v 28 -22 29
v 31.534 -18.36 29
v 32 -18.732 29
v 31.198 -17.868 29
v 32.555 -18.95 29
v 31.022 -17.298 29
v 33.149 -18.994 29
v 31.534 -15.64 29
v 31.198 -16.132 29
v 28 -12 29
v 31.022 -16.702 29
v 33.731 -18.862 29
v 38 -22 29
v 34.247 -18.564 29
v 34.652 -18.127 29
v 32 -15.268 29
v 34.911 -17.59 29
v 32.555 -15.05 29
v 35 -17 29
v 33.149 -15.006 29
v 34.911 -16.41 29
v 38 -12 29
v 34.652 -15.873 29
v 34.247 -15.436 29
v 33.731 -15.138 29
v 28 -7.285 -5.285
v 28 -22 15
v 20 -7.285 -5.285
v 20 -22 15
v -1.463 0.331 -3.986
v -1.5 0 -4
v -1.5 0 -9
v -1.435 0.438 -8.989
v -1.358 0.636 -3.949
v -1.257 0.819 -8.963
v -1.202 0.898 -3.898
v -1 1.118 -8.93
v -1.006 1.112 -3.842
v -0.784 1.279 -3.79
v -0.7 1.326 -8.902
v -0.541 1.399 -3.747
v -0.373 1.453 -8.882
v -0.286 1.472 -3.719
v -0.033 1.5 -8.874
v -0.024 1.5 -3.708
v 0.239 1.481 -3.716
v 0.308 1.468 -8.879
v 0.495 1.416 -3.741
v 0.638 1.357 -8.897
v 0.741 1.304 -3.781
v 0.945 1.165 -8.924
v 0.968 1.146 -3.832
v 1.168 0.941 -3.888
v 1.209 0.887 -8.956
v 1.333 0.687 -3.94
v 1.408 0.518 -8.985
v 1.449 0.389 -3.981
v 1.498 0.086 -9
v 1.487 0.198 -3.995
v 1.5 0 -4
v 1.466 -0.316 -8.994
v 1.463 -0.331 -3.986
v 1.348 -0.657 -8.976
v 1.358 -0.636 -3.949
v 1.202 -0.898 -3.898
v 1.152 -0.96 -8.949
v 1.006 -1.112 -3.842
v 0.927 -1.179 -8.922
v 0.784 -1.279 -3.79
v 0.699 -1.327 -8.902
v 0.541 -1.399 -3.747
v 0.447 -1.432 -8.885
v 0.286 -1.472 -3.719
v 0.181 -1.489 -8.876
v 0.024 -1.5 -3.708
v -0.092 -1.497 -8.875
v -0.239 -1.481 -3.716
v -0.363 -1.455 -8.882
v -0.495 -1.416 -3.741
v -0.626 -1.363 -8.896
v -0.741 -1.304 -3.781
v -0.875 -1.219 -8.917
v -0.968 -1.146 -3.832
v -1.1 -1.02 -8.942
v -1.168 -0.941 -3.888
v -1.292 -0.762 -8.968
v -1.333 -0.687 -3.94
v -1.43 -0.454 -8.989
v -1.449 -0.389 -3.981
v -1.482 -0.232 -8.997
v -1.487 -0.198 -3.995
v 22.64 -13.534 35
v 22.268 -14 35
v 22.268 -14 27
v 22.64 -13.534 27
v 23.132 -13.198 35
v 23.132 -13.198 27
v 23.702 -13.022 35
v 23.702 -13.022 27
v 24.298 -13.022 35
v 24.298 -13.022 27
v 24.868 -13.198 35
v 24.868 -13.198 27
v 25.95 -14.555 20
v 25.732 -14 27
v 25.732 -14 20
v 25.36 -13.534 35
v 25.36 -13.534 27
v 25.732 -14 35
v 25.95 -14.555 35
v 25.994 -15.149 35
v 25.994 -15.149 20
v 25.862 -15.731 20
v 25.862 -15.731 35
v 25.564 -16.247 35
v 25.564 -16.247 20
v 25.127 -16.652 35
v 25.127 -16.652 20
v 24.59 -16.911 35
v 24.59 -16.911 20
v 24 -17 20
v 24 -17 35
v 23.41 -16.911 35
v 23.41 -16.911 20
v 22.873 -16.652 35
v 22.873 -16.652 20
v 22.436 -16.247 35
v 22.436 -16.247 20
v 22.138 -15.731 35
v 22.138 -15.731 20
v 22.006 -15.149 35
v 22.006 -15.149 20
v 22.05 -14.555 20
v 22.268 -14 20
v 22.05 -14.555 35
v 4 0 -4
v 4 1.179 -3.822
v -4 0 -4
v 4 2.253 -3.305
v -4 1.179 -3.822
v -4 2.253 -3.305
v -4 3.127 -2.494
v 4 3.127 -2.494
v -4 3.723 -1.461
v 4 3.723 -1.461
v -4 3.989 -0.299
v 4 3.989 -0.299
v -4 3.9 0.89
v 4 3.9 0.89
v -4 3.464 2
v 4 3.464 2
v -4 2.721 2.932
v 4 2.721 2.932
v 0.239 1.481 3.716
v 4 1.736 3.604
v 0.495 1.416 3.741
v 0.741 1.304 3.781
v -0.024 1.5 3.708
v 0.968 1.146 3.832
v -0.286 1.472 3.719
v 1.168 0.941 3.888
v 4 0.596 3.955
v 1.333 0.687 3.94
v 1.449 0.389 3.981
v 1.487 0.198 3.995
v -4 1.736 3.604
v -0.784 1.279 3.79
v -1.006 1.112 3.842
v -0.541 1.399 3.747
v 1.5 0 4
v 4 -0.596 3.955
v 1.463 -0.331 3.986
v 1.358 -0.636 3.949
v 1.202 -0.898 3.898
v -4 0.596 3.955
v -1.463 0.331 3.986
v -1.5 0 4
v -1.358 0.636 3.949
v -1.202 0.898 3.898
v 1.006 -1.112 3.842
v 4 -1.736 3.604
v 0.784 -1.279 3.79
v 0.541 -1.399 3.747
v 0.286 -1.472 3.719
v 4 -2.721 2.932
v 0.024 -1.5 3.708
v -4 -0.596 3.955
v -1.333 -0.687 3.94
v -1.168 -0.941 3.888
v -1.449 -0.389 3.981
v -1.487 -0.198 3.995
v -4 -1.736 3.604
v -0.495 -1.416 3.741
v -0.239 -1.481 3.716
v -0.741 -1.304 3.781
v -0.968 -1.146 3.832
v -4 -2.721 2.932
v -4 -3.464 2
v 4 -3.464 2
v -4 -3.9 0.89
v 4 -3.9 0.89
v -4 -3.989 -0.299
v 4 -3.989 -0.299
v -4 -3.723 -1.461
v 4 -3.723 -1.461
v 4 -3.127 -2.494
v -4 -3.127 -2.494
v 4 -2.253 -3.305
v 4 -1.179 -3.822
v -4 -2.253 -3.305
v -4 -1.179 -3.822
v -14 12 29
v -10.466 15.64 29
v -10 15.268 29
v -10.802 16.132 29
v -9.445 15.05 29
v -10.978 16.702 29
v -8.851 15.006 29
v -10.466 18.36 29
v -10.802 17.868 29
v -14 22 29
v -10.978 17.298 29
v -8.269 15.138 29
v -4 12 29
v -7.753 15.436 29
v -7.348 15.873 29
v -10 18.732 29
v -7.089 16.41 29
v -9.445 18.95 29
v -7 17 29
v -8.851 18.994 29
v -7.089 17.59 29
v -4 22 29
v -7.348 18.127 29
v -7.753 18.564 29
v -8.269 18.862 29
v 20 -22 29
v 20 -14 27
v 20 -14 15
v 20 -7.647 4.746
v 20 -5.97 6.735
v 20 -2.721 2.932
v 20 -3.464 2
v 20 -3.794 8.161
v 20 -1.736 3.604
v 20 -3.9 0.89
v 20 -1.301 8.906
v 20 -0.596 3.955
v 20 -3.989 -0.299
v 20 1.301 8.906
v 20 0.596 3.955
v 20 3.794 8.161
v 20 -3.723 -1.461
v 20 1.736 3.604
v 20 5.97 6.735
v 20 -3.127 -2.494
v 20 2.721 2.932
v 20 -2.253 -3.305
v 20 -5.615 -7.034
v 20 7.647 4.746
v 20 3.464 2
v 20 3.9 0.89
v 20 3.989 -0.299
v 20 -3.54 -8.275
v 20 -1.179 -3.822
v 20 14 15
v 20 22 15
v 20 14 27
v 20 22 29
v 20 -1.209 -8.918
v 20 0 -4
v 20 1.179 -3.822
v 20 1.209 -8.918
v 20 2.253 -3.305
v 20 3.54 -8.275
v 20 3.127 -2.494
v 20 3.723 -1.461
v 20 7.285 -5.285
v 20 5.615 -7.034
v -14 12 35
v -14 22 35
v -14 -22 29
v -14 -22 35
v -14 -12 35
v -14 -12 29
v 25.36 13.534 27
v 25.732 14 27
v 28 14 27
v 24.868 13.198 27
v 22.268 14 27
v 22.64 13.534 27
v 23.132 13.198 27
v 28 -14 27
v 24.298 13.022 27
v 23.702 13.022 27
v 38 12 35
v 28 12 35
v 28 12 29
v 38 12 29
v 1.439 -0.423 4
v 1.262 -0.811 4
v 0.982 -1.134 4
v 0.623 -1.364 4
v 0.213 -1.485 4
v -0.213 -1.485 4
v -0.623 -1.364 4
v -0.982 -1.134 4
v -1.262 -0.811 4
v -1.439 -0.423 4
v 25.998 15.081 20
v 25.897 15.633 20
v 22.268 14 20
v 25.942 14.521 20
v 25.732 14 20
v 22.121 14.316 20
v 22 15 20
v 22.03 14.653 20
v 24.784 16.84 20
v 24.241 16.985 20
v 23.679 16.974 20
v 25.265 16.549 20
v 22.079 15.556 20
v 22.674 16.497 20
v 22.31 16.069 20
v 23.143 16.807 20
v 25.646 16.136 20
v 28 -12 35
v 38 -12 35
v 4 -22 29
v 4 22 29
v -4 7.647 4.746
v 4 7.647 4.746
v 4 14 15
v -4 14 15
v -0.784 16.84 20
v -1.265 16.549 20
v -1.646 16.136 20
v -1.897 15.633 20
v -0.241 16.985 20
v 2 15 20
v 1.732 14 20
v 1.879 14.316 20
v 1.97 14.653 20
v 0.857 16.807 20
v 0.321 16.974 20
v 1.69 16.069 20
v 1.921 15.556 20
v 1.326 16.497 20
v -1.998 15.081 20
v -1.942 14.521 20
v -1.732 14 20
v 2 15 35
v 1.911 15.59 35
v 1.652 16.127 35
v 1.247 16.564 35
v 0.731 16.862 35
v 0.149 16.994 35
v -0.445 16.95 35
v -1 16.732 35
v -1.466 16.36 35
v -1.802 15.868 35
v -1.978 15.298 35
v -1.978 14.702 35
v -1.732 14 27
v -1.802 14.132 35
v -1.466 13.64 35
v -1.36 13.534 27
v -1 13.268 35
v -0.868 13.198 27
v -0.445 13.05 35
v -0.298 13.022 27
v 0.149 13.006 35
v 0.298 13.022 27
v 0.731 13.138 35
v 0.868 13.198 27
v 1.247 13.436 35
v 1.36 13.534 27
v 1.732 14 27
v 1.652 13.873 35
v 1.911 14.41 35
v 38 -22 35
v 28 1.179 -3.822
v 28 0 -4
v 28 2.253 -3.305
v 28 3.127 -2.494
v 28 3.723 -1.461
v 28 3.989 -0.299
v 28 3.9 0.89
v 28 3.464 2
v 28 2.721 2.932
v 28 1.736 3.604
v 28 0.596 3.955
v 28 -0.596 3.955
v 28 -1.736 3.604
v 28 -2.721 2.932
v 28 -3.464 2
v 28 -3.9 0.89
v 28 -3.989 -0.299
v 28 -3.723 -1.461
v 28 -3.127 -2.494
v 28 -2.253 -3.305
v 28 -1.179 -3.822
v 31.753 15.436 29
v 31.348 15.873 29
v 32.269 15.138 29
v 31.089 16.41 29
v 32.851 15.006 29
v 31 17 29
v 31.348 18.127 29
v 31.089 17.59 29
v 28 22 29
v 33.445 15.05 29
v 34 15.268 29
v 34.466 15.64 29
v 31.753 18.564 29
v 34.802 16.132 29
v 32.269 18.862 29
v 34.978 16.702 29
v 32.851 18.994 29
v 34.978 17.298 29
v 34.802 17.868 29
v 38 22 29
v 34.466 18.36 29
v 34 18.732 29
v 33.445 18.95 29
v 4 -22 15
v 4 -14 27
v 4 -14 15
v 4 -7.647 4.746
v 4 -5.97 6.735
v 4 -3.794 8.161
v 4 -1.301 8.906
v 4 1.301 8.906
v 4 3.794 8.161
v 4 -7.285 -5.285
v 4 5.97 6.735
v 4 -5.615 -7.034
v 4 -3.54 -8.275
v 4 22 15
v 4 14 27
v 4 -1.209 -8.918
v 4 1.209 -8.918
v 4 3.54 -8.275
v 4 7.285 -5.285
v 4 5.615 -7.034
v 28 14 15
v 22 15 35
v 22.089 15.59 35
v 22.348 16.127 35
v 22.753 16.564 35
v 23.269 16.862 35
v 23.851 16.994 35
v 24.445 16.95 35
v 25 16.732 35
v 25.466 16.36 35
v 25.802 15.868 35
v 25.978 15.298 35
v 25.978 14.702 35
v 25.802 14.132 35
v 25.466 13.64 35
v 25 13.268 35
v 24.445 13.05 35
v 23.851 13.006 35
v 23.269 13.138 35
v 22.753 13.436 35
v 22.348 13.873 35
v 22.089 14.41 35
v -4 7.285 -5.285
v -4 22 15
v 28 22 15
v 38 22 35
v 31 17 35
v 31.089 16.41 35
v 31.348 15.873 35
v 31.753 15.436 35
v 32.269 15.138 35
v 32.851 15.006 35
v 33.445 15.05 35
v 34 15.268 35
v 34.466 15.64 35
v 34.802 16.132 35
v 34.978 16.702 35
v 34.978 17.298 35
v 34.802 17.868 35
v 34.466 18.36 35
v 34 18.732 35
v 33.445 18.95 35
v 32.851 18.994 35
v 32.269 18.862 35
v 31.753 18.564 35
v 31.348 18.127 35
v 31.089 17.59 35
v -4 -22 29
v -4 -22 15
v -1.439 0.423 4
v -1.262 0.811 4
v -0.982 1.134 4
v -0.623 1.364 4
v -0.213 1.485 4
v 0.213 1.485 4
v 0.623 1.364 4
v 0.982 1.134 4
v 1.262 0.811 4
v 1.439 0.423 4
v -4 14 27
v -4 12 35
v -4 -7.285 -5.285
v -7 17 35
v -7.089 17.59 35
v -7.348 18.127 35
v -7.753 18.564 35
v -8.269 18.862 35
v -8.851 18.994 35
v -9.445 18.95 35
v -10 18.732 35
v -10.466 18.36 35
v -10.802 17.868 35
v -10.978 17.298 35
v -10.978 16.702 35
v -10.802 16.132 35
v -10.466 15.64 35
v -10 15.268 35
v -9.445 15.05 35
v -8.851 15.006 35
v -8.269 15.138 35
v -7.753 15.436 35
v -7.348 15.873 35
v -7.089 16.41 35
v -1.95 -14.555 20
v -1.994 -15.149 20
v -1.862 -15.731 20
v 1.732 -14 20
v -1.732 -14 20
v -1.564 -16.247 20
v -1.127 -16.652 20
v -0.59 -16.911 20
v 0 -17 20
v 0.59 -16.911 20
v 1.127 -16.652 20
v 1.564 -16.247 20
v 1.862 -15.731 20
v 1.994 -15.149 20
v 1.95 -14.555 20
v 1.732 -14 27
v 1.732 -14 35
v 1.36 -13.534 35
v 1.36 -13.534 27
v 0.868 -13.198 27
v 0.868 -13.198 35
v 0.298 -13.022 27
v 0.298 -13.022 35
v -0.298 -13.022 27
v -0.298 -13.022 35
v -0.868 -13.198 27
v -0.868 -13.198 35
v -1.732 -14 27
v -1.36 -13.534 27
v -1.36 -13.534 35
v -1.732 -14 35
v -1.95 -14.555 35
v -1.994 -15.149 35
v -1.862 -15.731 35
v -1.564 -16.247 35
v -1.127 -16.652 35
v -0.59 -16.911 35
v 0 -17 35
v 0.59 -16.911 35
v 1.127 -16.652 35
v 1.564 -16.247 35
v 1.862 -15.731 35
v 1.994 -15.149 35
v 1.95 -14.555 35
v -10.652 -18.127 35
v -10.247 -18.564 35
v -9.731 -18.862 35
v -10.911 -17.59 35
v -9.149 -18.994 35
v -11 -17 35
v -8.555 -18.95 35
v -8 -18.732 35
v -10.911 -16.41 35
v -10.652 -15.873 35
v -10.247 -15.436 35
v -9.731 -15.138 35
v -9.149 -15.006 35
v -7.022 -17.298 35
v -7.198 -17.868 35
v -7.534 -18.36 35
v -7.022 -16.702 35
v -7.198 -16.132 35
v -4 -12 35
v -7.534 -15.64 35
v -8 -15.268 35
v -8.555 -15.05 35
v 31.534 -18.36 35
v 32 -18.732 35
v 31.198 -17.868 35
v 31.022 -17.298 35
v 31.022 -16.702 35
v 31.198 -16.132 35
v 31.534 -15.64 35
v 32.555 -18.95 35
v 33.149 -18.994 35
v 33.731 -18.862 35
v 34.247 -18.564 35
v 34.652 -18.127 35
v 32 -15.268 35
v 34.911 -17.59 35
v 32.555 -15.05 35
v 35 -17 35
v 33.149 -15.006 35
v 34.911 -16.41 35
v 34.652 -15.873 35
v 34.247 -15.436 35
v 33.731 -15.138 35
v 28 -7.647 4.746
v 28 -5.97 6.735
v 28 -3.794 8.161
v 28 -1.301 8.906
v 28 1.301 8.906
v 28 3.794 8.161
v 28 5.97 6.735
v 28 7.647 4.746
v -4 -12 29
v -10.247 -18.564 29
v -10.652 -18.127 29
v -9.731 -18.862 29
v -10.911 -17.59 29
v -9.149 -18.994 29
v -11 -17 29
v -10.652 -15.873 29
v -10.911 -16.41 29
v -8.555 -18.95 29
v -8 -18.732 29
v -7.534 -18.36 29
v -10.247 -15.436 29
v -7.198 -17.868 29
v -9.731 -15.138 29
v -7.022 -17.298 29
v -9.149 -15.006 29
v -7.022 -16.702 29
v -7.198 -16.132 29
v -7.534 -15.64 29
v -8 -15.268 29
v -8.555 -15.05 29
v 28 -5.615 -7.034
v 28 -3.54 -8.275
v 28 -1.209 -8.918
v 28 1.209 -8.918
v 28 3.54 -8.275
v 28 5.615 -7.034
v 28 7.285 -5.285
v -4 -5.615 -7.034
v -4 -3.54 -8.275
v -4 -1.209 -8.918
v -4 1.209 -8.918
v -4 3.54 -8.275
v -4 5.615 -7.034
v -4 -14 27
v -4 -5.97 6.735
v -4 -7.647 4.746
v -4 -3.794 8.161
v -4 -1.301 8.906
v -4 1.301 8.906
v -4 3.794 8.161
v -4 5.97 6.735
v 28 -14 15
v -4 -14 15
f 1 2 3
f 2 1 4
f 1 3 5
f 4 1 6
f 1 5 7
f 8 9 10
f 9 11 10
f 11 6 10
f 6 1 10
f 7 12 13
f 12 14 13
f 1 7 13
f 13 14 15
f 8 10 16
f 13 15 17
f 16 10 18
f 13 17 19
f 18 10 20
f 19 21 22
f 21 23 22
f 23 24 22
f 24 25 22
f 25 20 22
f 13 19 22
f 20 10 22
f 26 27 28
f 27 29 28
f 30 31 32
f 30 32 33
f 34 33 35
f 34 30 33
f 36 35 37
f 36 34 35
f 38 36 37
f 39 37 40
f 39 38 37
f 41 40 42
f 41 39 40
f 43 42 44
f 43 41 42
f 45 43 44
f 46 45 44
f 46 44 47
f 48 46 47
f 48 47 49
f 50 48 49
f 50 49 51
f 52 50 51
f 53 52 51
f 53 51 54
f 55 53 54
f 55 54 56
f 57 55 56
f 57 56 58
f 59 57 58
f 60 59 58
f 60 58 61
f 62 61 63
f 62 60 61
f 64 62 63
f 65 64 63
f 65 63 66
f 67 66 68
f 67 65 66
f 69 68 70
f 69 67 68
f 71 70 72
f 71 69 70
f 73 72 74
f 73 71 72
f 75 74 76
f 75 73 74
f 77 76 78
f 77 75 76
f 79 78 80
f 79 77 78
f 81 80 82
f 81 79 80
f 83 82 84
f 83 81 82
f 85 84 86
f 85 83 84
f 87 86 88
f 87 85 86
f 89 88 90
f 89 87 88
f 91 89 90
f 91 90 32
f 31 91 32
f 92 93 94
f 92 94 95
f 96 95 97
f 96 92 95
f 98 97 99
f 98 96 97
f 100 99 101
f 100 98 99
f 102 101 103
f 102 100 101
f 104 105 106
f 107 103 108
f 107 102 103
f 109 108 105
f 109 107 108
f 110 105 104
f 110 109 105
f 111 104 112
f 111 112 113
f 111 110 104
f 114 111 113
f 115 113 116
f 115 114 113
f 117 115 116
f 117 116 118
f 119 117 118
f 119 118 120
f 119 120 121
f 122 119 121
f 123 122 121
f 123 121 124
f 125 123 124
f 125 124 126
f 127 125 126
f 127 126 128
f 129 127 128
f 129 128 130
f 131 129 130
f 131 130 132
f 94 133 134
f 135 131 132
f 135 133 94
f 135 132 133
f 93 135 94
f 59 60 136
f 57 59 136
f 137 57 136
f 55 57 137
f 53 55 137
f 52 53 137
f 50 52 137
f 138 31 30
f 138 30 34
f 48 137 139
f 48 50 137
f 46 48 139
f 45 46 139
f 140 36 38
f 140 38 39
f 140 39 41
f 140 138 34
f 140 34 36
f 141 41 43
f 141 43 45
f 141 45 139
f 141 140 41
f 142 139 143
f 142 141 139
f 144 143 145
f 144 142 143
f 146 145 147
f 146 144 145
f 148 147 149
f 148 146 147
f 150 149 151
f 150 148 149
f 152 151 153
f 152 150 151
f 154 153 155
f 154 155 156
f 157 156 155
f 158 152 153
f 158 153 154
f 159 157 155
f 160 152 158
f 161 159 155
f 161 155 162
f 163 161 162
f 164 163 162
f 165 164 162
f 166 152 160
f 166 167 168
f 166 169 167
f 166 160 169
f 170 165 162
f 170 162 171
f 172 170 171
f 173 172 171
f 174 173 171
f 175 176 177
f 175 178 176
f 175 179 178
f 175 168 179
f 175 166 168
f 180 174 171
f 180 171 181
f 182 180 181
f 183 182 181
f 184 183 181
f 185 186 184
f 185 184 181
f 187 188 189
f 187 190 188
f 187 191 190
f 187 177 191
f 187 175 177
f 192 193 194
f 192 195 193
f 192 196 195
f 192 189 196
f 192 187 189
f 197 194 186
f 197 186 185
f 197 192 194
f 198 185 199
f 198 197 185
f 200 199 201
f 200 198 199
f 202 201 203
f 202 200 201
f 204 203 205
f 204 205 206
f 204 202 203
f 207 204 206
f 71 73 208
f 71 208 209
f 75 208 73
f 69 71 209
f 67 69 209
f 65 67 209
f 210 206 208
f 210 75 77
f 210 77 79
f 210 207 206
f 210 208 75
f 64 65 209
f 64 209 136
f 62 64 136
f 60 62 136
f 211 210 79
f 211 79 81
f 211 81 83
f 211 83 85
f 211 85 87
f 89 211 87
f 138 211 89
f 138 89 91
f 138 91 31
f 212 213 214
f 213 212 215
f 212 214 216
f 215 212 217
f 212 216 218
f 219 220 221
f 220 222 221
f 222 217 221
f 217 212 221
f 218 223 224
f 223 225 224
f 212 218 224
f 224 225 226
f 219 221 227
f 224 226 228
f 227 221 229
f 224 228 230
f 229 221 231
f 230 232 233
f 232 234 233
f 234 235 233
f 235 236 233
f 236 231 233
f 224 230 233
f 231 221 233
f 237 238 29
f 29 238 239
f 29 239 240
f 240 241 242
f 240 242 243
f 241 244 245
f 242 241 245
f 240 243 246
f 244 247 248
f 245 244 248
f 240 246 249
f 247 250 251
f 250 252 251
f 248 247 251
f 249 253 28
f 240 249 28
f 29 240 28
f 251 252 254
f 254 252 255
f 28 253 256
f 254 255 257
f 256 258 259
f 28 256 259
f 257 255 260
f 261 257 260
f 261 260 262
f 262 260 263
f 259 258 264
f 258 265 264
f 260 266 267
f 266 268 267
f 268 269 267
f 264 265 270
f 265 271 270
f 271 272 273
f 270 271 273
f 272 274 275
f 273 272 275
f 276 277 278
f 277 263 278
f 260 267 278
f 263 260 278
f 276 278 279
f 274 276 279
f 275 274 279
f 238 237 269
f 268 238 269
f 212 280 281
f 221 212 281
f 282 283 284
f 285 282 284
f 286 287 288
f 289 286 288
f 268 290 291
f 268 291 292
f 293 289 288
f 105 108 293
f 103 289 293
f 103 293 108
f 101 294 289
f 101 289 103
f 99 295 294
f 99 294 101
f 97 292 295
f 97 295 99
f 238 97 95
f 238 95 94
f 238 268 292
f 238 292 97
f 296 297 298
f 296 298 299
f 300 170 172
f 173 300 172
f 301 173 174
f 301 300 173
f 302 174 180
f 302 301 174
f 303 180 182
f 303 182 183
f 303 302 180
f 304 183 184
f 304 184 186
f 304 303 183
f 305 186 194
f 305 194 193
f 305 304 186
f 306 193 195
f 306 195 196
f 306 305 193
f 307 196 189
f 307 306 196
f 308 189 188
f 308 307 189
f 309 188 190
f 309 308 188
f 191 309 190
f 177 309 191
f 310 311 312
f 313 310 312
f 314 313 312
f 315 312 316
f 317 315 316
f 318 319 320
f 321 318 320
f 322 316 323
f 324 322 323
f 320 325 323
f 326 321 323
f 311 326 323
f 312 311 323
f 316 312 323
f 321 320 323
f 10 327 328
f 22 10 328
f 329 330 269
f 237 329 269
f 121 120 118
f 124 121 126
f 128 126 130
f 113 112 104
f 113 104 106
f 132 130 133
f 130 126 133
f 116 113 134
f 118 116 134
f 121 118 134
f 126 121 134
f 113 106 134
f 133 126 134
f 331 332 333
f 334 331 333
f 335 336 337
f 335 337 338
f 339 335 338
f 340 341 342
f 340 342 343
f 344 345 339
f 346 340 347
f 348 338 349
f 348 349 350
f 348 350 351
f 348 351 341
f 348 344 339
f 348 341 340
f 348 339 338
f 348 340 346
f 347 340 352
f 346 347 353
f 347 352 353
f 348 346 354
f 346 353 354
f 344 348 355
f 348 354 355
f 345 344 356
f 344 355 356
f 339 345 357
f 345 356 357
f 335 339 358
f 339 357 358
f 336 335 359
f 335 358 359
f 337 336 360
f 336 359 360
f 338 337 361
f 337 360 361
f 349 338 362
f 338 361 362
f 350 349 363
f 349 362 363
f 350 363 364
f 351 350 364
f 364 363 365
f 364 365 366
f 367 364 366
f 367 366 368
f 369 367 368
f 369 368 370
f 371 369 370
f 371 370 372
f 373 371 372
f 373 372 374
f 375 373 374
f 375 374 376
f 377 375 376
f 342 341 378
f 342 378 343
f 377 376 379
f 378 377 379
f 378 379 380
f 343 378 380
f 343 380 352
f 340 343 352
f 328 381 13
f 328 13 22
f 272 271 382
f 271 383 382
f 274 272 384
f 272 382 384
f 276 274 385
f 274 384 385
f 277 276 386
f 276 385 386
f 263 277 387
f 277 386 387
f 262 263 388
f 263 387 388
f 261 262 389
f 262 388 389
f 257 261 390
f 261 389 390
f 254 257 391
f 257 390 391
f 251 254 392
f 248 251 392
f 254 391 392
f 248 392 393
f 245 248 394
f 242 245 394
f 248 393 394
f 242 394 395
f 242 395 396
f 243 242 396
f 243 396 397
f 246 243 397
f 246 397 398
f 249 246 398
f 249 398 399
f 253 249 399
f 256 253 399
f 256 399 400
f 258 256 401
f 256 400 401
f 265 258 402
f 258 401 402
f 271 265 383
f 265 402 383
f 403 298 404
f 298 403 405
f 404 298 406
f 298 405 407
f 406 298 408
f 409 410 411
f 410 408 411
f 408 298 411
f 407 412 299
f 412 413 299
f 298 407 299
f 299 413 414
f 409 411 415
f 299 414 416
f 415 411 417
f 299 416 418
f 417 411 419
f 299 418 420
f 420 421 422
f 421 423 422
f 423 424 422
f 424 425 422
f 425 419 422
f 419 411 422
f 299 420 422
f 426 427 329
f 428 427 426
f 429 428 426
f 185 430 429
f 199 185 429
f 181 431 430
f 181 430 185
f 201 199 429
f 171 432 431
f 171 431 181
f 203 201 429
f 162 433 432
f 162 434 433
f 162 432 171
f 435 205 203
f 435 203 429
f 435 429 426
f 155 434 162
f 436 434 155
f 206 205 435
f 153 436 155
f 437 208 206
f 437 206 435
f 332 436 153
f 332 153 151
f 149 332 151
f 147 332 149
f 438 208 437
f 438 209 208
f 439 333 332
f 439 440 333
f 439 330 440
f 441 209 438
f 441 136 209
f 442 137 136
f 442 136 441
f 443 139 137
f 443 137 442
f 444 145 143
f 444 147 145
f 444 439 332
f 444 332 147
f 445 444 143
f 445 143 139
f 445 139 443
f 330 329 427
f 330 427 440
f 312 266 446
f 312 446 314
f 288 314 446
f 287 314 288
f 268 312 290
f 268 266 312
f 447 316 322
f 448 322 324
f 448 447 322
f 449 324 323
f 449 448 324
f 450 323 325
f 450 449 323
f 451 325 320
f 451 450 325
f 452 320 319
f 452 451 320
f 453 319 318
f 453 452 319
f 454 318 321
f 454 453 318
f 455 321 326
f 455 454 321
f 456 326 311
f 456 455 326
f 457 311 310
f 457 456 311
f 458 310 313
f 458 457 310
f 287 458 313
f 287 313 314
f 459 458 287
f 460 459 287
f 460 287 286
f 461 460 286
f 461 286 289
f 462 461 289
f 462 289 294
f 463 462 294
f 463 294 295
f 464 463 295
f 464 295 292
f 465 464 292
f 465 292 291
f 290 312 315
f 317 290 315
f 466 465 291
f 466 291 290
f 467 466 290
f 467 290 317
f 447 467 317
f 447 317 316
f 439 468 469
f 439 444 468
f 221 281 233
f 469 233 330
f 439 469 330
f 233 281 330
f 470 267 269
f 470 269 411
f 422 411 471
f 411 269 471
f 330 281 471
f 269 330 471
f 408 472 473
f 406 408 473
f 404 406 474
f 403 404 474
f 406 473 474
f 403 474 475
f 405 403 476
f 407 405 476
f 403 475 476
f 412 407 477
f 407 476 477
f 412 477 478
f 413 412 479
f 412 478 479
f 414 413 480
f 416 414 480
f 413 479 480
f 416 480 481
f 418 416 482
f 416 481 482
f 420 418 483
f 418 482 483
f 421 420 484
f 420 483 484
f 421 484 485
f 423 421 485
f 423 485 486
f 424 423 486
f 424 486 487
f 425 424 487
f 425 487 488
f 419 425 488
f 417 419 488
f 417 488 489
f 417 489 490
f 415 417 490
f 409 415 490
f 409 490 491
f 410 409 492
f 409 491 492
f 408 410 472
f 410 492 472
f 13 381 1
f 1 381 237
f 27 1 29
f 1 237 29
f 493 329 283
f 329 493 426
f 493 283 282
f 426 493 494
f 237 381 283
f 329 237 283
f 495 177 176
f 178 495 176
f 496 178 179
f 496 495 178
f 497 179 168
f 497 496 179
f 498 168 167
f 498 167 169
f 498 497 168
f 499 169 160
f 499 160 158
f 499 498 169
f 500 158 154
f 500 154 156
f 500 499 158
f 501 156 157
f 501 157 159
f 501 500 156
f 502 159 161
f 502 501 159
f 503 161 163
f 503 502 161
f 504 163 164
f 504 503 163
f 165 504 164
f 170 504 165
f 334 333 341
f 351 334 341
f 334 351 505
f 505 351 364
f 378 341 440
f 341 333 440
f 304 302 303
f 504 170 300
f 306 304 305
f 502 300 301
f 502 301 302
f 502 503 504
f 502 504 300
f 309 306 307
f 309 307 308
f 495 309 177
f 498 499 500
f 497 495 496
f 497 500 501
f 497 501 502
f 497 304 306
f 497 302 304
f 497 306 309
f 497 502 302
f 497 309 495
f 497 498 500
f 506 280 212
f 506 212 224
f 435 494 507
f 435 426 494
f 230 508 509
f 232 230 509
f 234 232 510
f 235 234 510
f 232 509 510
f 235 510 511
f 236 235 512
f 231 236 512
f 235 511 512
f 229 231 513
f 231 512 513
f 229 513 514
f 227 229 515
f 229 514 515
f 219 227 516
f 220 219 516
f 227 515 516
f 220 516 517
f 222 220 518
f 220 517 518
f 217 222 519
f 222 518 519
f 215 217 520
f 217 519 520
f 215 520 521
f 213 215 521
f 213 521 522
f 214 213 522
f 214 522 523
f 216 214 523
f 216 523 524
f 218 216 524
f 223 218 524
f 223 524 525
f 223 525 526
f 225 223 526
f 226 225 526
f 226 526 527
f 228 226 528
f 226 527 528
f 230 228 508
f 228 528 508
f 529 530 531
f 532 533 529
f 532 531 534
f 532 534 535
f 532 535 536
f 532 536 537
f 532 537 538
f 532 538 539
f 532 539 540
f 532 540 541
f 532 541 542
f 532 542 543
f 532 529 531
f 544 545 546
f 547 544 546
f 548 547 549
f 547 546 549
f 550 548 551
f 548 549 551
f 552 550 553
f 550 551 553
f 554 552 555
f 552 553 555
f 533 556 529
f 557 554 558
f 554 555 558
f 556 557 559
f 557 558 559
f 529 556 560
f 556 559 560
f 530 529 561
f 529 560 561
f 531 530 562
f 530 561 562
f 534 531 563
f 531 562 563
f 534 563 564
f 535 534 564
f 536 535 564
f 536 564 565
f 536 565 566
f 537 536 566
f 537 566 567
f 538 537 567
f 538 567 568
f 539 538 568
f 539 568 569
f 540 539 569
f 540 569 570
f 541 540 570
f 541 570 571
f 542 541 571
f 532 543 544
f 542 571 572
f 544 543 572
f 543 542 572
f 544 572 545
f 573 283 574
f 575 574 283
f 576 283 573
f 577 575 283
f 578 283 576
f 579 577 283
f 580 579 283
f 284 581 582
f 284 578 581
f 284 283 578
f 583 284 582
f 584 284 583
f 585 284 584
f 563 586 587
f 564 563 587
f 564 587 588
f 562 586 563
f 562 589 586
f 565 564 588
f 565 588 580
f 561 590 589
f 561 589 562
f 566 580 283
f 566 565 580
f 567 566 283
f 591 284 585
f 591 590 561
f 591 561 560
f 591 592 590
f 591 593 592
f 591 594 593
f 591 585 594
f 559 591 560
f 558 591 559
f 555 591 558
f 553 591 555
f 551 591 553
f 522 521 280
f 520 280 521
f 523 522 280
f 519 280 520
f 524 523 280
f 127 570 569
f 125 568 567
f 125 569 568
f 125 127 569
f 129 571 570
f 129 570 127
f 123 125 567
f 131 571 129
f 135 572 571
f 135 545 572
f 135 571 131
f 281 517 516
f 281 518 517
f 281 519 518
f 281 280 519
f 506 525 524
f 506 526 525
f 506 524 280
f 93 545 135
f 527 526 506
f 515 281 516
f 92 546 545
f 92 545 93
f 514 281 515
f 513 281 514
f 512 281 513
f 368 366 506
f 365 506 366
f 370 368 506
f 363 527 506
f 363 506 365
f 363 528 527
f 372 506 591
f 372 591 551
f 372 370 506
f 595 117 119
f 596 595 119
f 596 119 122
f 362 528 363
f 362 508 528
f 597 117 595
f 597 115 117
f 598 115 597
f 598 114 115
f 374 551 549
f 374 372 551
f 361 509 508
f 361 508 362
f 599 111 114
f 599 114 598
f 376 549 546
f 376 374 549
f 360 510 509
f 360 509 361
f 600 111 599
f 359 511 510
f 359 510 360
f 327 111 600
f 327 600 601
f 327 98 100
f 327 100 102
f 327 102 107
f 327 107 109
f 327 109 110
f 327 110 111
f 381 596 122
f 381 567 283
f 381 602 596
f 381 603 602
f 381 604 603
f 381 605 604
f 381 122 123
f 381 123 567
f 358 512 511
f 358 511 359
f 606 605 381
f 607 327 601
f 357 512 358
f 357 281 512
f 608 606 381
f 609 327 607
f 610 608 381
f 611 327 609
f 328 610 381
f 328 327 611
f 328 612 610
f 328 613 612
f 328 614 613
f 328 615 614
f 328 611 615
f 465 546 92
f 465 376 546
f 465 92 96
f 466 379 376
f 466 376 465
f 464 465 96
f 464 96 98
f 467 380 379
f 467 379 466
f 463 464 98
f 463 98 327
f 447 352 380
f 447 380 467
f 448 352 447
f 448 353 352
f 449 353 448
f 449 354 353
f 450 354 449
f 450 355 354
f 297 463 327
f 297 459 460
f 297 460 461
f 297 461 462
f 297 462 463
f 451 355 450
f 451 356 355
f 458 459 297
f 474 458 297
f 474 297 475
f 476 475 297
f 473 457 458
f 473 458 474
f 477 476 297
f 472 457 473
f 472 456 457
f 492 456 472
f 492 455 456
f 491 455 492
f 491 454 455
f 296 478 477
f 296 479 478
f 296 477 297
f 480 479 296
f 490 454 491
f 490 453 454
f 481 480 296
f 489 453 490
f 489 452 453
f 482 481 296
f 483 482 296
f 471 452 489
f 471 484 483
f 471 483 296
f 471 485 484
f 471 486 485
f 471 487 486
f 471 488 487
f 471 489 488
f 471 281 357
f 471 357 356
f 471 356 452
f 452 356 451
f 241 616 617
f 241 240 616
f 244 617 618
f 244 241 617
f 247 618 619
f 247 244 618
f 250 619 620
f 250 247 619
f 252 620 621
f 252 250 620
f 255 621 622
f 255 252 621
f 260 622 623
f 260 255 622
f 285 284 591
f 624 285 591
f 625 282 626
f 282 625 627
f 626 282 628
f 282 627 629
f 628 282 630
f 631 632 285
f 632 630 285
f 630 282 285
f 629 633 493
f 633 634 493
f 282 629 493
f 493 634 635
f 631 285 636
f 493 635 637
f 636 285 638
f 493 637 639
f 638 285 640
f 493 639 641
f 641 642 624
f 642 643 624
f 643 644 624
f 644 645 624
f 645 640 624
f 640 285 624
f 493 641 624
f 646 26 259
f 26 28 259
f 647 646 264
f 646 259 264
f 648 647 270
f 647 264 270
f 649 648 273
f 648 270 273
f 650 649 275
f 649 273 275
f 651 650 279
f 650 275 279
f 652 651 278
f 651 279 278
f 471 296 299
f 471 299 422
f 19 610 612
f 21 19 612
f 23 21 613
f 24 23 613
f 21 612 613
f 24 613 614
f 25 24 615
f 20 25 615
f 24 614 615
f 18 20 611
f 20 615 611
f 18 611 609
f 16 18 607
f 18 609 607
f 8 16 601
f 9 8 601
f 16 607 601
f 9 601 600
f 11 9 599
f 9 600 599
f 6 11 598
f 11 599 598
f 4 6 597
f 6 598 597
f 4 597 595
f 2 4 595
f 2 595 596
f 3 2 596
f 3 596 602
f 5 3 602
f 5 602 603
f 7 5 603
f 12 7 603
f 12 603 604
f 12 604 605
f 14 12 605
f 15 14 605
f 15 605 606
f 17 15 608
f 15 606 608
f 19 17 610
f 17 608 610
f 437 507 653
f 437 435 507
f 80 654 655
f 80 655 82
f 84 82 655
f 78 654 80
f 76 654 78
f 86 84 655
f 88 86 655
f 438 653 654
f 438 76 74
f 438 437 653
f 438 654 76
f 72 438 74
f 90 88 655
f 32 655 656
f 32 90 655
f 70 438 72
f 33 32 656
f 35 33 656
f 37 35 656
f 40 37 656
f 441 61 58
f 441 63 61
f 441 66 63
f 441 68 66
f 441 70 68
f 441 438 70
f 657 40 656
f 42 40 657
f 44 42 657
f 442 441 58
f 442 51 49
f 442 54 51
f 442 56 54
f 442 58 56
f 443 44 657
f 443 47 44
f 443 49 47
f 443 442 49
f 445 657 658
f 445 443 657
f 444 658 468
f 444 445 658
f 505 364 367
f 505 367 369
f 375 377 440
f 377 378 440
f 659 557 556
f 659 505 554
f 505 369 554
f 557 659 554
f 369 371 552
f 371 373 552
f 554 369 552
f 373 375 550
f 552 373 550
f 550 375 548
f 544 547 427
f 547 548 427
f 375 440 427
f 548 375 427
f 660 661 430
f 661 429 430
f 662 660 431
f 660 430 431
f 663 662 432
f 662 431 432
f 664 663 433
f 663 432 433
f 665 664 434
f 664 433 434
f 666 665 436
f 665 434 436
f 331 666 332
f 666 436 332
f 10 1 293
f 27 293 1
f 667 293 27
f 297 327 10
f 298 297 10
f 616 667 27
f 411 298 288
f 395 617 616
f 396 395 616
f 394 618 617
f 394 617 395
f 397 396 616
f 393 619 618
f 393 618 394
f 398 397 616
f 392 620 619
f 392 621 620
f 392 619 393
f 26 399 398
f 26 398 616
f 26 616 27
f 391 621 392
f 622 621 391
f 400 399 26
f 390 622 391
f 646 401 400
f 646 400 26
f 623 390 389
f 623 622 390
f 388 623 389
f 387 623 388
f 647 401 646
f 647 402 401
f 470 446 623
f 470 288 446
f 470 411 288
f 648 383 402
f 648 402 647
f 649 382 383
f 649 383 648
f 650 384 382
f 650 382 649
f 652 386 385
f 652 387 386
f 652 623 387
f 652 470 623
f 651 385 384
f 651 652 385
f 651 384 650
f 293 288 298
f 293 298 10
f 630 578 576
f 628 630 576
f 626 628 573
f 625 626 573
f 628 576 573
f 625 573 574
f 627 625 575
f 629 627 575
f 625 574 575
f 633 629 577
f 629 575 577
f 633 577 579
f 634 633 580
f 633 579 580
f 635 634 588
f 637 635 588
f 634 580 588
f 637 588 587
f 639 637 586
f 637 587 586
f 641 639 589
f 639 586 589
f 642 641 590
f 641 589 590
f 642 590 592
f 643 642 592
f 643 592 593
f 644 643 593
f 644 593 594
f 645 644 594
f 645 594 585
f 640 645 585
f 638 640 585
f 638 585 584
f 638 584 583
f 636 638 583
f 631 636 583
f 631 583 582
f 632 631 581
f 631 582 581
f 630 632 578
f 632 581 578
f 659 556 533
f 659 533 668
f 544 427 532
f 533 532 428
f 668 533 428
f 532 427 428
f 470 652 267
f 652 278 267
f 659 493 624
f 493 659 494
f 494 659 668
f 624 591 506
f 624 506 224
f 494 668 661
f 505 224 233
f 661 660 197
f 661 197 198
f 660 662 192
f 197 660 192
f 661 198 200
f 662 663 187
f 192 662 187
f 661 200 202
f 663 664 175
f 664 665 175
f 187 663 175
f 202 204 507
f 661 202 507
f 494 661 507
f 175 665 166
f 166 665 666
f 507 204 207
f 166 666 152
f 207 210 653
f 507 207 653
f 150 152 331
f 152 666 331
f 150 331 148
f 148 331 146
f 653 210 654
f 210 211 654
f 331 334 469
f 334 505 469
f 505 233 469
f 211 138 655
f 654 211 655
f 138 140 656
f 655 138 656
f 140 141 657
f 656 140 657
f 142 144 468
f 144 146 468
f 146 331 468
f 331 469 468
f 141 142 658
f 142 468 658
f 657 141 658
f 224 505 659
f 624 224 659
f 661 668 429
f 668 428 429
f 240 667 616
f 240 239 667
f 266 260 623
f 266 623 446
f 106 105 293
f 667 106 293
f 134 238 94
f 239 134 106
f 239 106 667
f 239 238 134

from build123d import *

# Parameters (mm, degrees)
SKETCH_1_R          = 4
EXTRUDE_1_DEPTH     = 4
SKETCH_2_R          = 2
CUT_EXTRUDE_1_DEPTH = 15
SKETCH_4_W          = 16
SKETCH_4_H          = 44
EXTRUDE_2_DEPTH     = 6
SKETCH_5_W          = 10
SKETCH_5_H          = 10
SKETCH_5_R          = 2
EXTRUDE_3_DEPTH     = 6
SKETCH_6_R          = 1.5
CUT_EXTRUDE_2_DEPTH = 54.749418602


with BuildPart() as part:
    # 草图1 → 凸台-拉伸1 (new, symmetric)
    with BuildSketch(Plane(origin=(0, 0, 0), x_dir=(0, 0, -1), z_dir=(1, 0, 0))):
        with BuildLine():
            Line((5.28471901, 7.285035689), (-15, 22))
            Line((-15, 22), (-35, 22))
            Line((-35, 22), (-35, -0.025536126))
            Line((-35, -0.025536126), (-35, -22))
            Line((-35, -22), (-15, -22))
            Line((-15, -22), (5.28471901, -7.285035689))
            ThreePointArc((5.28471901, -7.285035689), (9, 0), (5.28471901, 7.285035689))
        make_face()
        Circle(SKETCH_1_R, mode=Mode.SUBTRACT)
        with BuildLine():
            Line((-4.746449606, 7.646647379), (-15, 14))
            Line((-15, 14), (-27, 14))
            Line((-27, 14), (-27, -14))
            Line((-27, -14), (-15, -14))
            Line((-15, -14), (-4.746449606, -7.646647379))
            ThreePointArc((-4.746449606, -7.646647379), (-9, 0), (-4.746449606, 7.646647379))
        make_face(mode=Mode.SUBTRACT)
    extrude_1 = extrude(amount=EXTRUDE_1_DEPTH, both=True)

    # 草图2 → 切除-拉伸1 (cut)
    with BuildSketch(Plane.XY.offset(35)):
        with Locations((0, 15)):
            Circle(SKETCH_2_R)
        with Locations(Location((0, -15, 0), (0, 0, 30))):
            Circle(SKETCH_2_R)
    cut_extrude_1 = extrude(amount=-CUT_EXTRUDE_1_DEPTH, mode=Mode.SUBTRACT)

    # 草图4 → 凸台-拉伸2 (add)
    with BuildSketch(Plane.XY.offset(35)):
        with Locations((12, 0)):
            Rectangle(SKETCH_4_W, SKETCH_4_H)
    extrude(amount=-EXTRUDE_2_DEPTH)

    # 镜向1: 凸台-拉伸1, 切除-拉伸1 across plane
    add(extrude_1.mirror(Plane(origin=(12, 0, 0), x_dir=(0, 0, 1), z_dir=(1, 0, 0))))
    add(cut_extrude_1.mirror(Plane(origin=(12, 0, 0), x_dir=(0, 0, 1), z_dir=(1, 0, 0))), mode=Mode.SUBTRACT)

    # 草图5 → 凸台-拉伸3 (add)
    # profile 1 of 4: a face of its own
    with BuildSketch(Plane.XY.offset(35)):
        with Locations((-9, 17)):
            Rectangle(SKETCH_5_W, SKETCH_5_H)
        with Locations((-9, 17)):
            Circle(SKETCH_5_R, mode=Mode.SUBTRACT)
    # profile 2 of 4: a face of its own
    with BuildSketch(Plane.XY.offset(35)):
        with Locations((33, 17)):
            Rectangle(SKETCH_5_W, SKETCH_5_H)
        with Locations(Location((33, 17, 0), (0, 0, 180))):
            Circle(SKETCH_5_R, mode=Mode.SUBTRACT)
    # profile 3 of 4: a face of its own
    with BuildSketch(Plane.XY.offset(35)):
        with Locations((33, -17)):
            Rectangle(SKETCH_5_W, SKETCH_5_H)
        with Locations((33, -17)):
            Circle(SKETCH_5_R, mode=Mode.SUBTRACT)
    # profile 4 of 4: a face of its own
    with BuildSketch(Plane.XY.offset(35)):
        with Locations((-9, -17)):
            Rectangle(SKETCH_5_W, SKETCH_5_H)
        with Locations(Location((-9, -17, 0), (0, 0, 180))):
            Circle(SKETCH_5_R, mode=Mode.SUBTRACT)
    extrude(amount=-EXTRUDE_3_DEPTH)

    # 草图6 → 切除-拉伸2 (cut, through all)
    with BuildSketch(Plane(origin=(0, 0, 4), x_dir=(-1, 0, 0), z_dir=(0, 0, -1))):
        Circle(SKETCH_6_R)
    extrude(amount=CUT_EXTRUDE_2_DEPTH, mode=Mode.SUBTRACT)


solid = part.part
